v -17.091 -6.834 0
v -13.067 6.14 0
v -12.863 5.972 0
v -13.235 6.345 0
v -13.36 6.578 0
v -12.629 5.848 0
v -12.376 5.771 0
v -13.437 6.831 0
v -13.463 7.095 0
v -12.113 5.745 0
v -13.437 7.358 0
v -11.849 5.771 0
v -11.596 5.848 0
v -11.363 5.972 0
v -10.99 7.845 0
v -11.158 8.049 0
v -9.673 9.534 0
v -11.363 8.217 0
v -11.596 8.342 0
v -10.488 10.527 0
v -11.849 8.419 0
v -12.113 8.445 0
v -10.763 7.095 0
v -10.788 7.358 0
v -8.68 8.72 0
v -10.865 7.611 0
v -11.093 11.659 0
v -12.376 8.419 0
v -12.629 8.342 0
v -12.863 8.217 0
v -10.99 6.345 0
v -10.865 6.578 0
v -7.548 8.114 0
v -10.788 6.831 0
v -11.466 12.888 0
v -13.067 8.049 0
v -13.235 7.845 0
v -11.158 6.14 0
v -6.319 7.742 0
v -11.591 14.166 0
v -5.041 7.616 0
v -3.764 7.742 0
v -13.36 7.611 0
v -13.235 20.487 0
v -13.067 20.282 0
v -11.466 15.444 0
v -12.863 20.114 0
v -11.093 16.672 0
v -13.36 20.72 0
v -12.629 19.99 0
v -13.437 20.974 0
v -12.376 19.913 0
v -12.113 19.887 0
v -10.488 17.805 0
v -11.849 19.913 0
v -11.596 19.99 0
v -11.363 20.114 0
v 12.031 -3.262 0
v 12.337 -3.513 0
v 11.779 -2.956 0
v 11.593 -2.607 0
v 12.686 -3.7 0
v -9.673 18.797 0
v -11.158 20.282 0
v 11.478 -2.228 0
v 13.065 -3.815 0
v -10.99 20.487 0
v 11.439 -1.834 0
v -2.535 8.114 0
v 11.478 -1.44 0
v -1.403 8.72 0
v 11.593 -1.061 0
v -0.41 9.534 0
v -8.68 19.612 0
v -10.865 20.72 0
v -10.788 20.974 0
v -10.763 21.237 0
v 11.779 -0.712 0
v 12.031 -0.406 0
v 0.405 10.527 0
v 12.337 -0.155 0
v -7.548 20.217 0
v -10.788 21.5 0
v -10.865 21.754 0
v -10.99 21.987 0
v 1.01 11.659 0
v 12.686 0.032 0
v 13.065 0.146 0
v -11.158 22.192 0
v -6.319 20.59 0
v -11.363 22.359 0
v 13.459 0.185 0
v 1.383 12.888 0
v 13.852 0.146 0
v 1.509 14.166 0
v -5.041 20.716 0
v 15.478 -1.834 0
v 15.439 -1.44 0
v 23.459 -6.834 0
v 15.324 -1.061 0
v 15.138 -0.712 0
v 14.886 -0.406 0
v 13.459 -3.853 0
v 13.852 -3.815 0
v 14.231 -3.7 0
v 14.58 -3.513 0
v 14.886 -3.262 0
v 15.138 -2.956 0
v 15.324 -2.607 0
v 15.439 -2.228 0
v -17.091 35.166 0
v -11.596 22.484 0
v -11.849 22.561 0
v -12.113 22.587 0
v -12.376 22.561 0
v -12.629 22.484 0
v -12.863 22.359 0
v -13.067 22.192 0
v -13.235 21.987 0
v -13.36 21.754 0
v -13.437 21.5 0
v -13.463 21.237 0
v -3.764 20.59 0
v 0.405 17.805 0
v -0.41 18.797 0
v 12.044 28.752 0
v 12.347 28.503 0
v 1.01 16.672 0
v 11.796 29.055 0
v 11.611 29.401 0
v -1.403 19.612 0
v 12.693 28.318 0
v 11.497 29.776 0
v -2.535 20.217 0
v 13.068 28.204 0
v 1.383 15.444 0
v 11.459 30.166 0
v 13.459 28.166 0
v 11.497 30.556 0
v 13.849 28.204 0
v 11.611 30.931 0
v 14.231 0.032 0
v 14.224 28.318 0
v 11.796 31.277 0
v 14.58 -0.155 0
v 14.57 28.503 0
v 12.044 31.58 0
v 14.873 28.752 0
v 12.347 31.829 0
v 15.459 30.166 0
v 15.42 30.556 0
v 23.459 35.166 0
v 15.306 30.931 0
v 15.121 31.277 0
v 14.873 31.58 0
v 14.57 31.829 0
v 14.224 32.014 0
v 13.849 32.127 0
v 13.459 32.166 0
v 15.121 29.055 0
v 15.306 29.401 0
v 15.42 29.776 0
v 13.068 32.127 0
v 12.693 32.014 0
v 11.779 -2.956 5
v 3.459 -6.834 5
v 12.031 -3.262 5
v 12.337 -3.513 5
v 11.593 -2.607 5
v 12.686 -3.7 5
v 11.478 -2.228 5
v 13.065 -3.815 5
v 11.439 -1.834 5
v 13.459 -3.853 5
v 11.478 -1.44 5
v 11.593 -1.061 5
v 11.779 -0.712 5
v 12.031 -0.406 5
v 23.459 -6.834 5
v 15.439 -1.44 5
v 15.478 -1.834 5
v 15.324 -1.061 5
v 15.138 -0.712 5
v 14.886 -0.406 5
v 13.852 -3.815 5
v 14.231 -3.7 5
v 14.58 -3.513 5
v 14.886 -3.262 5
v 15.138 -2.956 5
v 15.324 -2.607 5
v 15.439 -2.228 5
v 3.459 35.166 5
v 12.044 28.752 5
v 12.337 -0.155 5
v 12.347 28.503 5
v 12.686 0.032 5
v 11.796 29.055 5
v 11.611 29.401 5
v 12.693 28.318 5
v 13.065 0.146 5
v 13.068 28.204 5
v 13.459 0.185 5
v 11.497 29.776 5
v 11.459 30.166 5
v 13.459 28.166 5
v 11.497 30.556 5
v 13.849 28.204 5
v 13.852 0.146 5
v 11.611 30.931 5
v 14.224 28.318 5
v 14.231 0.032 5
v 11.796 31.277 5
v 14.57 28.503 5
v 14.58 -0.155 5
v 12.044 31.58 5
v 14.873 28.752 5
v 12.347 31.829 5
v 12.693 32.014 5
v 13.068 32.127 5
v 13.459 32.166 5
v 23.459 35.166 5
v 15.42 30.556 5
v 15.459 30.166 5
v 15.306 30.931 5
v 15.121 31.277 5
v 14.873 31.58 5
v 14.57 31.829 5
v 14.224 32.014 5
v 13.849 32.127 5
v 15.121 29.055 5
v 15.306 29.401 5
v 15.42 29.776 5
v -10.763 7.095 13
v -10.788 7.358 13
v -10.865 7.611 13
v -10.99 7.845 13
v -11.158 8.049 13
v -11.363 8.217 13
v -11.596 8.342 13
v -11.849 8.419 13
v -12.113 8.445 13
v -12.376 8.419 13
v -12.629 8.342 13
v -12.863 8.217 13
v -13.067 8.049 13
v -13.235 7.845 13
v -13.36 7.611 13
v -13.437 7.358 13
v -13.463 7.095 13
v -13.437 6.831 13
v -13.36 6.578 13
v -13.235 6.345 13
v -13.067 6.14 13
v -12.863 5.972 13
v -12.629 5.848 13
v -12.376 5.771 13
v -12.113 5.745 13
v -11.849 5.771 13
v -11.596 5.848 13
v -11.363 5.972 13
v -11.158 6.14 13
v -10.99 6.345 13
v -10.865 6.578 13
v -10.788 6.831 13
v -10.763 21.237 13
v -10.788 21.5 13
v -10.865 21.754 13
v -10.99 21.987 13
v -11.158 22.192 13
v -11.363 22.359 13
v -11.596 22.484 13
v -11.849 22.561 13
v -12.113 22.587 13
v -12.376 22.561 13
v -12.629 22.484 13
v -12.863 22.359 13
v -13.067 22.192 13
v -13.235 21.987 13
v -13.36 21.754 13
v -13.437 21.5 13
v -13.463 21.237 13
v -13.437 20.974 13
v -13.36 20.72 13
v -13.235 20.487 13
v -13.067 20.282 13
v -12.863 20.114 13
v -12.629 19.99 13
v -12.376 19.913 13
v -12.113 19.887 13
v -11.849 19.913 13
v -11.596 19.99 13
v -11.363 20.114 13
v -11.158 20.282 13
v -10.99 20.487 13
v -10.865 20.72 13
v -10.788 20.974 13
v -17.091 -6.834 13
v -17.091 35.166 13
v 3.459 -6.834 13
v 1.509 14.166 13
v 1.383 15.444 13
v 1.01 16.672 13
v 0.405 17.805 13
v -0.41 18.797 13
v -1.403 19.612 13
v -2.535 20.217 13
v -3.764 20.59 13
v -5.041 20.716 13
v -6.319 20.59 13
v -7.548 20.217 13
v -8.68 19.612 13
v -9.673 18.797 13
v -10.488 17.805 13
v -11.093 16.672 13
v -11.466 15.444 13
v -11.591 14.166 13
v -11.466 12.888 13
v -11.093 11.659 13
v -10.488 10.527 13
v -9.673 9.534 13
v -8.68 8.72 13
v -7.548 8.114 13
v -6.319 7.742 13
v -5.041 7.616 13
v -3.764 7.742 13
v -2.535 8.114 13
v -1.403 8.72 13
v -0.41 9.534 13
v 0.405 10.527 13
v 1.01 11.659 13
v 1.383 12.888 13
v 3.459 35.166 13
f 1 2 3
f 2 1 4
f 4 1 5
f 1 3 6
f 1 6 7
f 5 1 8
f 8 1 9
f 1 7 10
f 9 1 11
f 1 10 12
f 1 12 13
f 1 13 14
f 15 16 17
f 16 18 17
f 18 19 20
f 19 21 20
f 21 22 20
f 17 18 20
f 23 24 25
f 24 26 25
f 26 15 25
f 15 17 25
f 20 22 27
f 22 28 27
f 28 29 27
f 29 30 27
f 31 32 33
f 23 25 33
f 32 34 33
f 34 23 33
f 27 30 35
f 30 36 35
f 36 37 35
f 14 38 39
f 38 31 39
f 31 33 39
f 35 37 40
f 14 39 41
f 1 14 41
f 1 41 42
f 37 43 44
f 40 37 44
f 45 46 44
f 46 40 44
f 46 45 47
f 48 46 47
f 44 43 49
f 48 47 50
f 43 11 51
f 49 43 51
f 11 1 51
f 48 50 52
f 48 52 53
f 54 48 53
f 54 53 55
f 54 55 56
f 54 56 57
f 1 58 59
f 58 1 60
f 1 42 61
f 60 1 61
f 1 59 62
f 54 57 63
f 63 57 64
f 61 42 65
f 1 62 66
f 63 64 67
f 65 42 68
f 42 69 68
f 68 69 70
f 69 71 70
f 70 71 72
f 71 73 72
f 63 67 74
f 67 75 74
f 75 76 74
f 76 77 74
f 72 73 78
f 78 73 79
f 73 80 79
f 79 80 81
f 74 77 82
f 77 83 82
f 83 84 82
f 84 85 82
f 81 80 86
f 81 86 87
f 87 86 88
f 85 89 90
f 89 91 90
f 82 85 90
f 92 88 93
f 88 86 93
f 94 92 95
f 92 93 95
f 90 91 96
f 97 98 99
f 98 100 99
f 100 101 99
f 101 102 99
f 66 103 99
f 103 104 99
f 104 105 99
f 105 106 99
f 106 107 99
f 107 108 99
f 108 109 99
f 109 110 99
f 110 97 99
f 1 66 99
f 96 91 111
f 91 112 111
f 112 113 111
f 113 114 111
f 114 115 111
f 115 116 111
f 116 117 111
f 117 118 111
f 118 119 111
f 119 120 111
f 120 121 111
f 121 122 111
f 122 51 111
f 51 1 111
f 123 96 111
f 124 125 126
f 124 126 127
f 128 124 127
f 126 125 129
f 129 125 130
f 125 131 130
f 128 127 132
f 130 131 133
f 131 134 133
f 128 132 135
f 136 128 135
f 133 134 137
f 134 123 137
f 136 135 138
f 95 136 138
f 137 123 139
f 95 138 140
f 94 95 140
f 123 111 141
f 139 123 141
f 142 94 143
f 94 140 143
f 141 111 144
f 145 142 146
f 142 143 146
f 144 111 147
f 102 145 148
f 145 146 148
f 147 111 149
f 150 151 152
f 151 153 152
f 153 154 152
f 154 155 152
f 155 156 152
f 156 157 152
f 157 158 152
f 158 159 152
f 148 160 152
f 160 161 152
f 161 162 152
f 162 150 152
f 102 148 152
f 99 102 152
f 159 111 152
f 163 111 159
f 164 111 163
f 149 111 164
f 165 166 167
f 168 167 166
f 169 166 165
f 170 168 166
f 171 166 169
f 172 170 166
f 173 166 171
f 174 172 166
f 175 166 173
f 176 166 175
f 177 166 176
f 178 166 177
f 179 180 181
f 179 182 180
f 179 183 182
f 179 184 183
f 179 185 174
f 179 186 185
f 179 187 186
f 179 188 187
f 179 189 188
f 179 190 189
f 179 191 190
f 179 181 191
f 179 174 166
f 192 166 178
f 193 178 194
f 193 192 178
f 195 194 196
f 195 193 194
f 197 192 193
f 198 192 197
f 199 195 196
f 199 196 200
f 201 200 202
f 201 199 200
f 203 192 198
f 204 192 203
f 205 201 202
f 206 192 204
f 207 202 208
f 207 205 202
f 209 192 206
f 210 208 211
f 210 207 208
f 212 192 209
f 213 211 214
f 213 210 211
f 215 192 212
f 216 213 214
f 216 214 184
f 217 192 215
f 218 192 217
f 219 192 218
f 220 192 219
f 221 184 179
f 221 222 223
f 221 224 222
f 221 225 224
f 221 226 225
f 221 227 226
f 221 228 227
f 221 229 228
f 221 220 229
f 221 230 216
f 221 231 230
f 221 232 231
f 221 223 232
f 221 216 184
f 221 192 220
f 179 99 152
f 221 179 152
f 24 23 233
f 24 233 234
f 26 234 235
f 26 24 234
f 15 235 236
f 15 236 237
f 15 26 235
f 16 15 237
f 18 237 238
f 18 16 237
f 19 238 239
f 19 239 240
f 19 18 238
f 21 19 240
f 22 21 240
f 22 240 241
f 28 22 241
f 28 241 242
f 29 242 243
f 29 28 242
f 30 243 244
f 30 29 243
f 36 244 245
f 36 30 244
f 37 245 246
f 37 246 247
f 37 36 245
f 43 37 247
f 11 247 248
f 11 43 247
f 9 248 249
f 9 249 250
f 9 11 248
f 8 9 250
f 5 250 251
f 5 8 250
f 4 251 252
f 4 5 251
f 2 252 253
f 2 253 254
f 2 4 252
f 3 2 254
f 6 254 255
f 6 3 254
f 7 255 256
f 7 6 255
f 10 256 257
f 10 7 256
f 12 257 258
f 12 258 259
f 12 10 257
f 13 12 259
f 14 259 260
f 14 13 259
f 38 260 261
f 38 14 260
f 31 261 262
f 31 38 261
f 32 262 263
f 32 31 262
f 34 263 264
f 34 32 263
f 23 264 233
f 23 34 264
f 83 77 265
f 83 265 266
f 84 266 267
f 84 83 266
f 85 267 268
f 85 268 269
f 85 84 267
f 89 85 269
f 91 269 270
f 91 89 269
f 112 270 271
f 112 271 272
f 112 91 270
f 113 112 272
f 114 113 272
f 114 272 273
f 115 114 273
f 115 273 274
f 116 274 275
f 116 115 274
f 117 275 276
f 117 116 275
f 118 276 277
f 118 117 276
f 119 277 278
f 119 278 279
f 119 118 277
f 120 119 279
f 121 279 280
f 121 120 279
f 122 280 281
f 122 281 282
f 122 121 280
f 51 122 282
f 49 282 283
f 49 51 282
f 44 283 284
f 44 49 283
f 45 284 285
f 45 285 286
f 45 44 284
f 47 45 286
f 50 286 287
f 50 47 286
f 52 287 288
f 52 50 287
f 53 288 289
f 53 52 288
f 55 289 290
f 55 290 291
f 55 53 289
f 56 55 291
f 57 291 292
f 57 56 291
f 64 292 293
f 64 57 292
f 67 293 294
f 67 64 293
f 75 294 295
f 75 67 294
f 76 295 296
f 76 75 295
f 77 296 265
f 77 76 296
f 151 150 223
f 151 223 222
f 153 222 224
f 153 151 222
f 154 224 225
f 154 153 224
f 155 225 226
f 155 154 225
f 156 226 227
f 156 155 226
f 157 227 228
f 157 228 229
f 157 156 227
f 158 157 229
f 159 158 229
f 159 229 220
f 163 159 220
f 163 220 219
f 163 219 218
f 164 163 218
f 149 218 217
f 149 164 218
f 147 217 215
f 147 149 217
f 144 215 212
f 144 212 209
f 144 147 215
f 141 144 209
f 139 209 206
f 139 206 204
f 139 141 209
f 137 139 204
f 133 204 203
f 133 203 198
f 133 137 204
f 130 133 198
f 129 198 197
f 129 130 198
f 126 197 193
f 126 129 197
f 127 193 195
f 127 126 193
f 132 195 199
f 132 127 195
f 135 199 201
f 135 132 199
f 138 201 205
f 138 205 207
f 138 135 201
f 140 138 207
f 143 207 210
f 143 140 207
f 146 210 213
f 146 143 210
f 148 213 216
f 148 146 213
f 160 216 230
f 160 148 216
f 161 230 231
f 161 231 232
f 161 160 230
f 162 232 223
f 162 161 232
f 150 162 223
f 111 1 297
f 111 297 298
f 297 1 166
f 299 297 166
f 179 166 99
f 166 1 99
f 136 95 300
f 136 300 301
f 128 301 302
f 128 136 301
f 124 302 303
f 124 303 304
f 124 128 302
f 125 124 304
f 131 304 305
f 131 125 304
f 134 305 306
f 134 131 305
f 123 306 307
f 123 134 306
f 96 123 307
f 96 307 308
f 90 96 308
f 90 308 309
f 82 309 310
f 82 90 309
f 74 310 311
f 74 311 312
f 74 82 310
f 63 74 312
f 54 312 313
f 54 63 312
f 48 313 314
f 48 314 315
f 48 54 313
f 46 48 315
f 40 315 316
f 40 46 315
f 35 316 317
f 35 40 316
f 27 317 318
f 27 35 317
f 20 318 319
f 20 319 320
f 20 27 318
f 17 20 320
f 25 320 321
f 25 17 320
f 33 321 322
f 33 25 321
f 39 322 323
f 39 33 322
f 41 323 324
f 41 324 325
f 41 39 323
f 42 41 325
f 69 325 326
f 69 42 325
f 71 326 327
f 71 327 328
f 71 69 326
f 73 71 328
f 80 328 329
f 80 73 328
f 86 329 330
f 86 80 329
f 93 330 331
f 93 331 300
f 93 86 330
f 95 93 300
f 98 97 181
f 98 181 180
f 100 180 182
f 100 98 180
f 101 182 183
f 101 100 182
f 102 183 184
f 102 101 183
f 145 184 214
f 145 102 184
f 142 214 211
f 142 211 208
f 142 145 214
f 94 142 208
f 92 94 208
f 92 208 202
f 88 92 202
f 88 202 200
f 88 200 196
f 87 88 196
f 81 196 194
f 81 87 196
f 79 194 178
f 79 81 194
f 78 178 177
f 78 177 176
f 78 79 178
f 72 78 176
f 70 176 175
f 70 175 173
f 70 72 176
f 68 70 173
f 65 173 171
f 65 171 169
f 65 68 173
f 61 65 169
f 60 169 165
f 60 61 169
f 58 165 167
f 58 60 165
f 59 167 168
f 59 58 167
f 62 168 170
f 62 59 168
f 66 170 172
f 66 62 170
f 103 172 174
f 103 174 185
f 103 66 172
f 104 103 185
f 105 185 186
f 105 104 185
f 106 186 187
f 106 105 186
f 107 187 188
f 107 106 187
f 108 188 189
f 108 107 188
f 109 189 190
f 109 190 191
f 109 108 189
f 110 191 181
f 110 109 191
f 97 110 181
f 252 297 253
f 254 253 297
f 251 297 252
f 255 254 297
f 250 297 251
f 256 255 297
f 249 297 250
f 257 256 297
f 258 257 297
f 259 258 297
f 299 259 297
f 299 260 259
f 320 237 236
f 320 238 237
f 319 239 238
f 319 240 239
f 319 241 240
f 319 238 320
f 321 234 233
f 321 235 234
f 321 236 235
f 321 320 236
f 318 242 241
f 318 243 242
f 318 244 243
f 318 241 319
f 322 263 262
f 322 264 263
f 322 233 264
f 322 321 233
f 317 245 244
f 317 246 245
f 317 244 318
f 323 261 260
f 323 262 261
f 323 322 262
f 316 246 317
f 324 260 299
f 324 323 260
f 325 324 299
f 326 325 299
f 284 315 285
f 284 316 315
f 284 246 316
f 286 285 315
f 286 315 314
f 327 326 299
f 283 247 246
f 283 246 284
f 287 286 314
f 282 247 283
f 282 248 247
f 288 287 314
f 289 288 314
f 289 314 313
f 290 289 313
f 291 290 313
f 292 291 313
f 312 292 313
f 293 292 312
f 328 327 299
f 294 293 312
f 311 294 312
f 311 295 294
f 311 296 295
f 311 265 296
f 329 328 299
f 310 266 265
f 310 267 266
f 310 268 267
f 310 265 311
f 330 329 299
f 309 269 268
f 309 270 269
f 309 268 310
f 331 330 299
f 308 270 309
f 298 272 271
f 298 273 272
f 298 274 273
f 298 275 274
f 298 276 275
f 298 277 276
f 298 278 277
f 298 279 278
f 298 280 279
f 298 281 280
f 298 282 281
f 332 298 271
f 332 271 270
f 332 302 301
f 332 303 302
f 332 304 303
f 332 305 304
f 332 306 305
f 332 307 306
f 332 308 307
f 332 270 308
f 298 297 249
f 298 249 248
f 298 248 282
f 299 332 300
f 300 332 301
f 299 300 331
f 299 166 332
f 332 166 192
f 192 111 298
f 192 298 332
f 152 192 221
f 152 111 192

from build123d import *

# Parameters (mm, degrees)
F0_W     = 20
F0_H     = 42
F0_R     = 2.0193883272
F0_R_2   = 2
F1_DEPTH = 5
F0_W_2   = 20.55
F0_R_3   = 1.35
F0_R_4   = 6.55
F2_DEPTH = 13


# Not quite as in the source:
# - a feature of the source that left no trace in its solid (it failed there, or was rolled back) is left out


with BuildPart() as f1:
    # F0 (on Top) → F1 (new body)
    with BuildSketch(Plane.XY):
        with Locations((13.4585087977, 14.1658929903)):
            Rectangle(F0_W, F0_H)
        with Locations((13.4585087977, -1.8341070097)):
            Circle(F0_R, mode=Mode.SUBTRACT)
        with Locations((13.4585087977, 30.1658929903)):
            Circle(F0_R_2, mode=Mode.SUBTRACT)
    extrude(amount=F1_DEPTH)

    # F0 (on Top) → F2 (join)
    with BuildSketch(Plane.XY):
        with Locations((-6.8164912023, 14.1658929903)):
            Rectangle(F0_W_2, F0_H)
        with Locations((-12.1125590142, 7.0948251784)):
            Circle(F0_R_3, mode=Mode.SUBTRACT)
        with Locations((-5.0414912023, 14.1658929903)):
            Circle(F0_R_4, mode=Mode.SUBTRACT)
        with Locations((-12.1125590142, 21.2369608022)):
            Circle(F0_R_3, mode=Mode.SUBTRACT)
    extrude(amount=F2_DEPTH)


solid = f1.part
